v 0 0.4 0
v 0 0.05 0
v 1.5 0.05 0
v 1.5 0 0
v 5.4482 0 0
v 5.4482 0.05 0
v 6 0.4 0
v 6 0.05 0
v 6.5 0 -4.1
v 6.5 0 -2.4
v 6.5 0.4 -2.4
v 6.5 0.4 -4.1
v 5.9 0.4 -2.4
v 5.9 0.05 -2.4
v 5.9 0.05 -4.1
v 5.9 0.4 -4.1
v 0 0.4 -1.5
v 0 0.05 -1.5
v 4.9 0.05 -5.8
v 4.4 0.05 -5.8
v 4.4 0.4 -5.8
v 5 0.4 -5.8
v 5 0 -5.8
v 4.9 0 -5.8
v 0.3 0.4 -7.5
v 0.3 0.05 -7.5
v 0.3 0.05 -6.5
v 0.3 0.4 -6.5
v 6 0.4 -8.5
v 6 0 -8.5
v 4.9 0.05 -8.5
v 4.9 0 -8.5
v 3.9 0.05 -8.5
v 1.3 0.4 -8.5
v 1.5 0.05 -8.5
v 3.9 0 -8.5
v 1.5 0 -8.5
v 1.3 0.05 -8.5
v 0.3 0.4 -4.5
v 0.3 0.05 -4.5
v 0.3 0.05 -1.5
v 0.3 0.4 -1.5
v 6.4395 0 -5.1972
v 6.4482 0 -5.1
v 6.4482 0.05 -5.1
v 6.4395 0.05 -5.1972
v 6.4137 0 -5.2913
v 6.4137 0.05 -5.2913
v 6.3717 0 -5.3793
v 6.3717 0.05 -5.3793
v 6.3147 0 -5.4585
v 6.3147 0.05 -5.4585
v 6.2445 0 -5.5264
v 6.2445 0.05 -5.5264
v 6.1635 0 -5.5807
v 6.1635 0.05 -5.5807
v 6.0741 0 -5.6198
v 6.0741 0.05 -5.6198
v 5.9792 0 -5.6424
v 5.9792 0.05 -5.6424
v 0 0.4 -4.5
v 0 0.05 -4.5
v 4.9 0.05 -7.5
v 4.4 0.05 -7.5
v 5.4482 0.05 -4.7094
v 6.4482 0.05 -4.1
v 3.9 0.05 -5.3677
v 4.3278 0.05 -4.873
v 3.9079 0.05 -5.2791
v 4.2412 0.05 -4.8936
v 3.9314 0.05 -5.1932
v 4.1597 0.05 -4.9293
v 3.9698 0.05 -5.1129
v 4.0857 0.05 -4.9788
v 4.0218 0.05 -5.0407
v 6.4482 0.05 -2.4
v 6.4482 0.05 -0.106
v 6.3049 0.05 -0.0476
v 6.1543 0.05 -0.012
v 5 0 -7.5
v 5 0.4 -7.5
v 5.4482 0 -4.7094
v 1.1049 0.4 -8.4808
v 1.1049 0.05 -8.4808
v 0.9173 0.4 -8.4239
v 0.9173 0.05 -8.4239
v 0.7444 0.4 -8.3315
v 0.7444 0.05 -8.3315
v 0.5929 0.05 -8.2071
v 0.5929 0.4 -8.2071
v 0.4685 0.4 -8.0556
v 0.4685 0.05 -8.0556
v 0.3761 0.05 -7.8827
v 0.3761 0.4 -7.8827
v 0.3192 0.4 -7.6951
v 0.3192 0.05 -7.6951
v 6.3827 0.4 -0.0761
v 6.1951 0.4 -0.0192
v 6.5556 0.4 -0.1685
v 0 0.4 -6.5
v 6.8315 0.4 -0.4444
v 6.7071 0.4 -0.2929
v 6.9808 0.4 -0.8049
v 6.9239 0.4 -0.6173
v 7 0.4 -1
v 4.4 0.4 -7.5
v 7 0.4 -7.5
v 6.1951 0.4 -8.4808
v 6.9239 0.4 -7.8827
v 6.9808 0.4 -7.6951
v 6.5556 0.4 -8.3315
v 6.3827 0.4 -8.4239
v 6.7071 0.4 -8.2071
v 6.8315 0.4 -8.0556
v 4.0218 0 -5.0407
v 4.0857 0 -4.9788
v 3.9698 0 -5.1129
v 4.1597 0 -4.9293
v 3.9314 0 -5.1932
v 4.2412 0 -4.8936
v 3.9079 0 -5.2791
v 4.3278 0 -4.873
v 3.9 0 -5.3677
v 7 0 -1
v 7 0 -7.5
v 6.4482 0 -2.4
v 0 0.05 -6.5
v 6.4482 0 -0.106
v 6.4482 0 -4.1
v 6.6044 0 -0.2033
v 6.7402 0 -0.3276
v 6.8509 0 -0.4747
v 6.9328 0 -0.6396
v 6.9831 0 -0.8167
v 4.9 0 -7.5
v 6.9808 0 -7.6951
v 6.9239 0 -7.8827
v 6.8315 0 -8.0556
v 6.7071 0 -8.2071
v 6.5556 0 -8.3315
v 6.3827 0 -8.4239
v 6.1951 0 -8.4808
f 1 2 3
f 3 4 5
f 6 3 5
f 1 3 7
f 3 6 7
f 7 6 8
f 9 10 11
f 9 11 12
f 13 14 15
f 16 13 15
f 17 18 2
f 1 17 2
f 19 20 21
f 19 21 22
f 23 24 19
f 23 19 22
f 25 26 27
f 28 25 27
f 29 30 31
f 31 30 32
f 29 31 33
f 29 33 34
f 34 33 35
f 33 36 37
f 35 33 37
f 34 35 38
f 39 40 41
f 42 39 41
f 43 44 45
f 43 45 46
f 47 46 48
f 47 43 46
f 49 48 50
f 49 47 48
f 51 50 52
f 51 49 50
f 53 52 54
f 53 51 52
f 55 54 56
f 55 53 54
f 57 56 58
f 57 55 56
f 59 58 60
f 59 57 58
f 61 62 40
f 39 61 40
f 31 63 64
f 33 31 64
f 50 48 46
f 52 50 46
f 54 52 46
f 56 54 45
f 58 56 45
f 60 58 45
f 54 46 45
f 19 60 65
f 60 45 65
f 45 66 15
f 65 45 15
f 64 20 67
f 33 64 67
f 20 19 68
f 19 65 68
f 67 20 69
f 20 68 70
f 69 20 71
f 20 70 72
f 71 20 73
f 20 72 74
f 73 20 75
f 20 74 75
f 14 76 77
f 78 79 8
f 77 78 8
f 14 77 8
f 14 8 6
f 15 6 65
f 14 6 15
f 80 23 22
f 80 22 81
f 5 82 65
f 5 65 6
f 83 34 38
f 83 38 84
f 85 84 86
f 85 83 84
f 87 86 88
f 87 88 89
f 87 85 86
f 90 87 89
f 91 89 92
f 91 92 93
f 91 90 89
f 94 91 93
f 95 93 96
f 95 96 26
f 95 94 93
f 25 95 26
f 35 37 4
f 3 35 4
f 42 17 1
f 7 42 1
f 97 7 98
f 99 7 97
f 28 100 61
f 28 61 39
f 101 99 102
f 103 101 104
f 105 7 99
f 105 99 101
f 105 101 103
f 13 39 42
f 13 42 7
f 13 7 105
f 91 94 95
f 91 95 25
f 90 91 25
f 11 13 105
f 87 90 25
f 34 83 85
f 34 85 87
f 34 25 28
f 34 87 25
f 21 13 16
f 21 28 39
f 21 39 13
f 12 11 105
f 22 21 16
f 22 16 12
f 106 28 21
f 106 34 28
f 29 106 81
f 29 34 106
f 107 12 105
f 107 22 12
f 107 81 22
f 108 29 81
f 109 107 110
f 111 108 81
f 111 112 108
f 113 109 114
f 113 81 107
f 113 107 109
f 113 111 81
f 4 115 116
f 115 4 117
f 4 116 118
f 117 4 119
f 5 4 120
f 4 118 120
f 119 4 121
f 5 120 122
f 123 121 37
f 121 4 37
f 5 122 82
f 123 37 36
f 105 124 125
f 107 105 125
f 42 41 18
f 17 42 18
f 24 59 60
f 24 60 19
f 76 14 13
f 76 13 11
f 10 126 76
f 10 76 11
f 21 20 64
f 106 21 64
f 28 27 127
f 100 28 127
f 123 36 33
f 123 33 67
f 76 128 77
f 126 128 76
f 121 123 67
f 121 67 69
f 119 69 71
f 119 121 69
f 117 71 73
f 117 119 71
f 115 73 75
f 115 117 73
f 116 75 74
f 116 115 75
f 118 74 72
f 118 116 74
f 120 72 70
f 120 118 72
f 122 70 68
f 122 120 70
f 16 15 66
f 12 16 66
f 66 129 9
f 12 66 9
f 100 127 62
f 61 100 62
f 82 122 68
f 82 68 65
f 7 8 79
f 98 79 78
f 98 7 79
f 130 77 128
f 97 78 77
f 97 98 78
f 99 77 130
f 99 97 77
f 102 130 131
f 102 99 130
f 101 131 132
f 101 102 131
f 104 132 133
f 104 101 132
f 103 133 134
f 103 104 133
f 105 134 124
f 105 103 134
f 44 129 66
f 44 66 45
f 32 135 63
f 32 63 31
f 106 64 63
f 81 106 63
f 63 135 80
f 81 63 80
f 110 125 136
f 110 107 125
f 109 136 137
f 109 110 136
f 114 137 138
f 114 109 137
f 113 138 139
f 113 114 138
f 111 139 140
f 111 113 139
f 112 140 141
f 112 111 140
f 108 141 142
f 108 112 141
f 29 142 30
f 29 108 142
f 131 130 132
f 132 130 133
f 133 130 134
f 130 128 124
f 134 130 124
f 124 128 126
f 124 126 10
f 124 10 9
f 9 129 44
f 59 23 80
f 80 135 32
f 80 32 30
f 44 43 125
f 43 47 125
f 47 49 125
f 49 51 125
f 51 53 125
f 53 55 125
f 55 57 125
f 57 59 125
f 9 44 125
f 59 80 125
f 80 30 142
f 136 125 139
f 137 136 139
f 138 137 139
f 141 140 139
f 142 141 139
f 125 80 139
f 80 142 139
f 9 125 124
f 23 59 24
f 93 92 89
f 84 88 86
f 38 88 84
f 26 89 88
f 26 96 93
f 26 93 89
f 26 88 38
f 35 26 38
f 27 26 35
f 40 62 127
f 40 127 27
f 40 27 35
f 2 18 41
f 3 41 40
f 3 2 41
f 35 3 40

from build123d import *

# Parameters (mm, degrees)
SKETCH1_W           = 0.6
SKETCH1_H           = 1.7
BOSS_EXTRUDE1_DEPTH = 0.4
FILLET2_R           = 1
SKETCH2_W           = 1.5
SKETCH2_H           = 8.5
CUT_EXTRUDE1_DEPTH  = 0.05


with BuildPart() as part:
    # Sketch1 → Boss-Extrude1 (new body)
    with BuildSketch(Plane(origin=(0, 0, 0), x_dir=(1, 0, 0), z_dir=(0, 1, 0))):
        Polygon((0, 0), (7, 0), (7, 8.5), (0.3, 8.5), (0.3, 6.5), (0, 6.5), (0, 4.5), (0.3, 4.5), (0.3, 1.5), (0, 1.5), align=None)
        with Locations((4.7, 6.65)):
            Rectangle(SKETCH1_W, SKETCH1_H, mode=Mode.SUBTRACT)
        with Locations((6.2, 3.25)):
            Rectangle(SKETCH1_W, SKETCH1_H, mode=Mode.SUBTRACT)
    extrude(amount=BOSS_EXTRUDE1_DEPTH)

    # Fillet2
    fillet2_edges = [part.edges().sort_by_distance(p)[0] for p in [
        (0.3, 0.2, -8.5),
        (7, 0.2, -8.5),
        (7, 0.2, 0),
    ]]
    fillet(fillet2_edges, radius=FILLET2_R)

    # Sketch2 → Cut-Extrude1 (cut)
    with BuildSketch(Plane.XZ):
        with BuildLine():
            Line((6.448166538, -2.4), (6.448166538, -5.1))
            ThreePointArc((6.448166538, -5.1), (6.314670512, -5.458517669), (5.979203511, -5.642414377))
            Line((5.979203511, -5.642414377), (4.9, -5.8))
            Line((4.9, -5.8), (4.9, -8.5))
            ThreePointArc((4.9, -8.5), (4.4, -9), (3.9, -8.5))
            Line((3.9, -8.5), (3.9, -5.8))
            Line((3.9, -5.8), (3.9, -5.367707784))
            ThreePointArc((3.9, -5.367707784), (4.021765938, -5.040692502), (4.327755978, -4.872954511))
            Line((4.327755978, -4.872954511), (5.448166538, -4.709351823))
            Line((5.448166538, -4.709351823), (5.448166538, -2.4))
            Line((5.448166538, -2.4), (5.448166538, 0))
            Line((5.448166538, 0), (6.448166538, 0))
            Line((6.448166538, 0), (6.448166538, -2.4))
        make_face()
        with Locations((0.75, -4.25)):
            Rectangle(SKETCH2_W, SKETCH2_H)
    extrude(amount=-CUT_EXTRUDE1_DEPTH, mode=Mode.SUBTRACT)


solid = part.part
